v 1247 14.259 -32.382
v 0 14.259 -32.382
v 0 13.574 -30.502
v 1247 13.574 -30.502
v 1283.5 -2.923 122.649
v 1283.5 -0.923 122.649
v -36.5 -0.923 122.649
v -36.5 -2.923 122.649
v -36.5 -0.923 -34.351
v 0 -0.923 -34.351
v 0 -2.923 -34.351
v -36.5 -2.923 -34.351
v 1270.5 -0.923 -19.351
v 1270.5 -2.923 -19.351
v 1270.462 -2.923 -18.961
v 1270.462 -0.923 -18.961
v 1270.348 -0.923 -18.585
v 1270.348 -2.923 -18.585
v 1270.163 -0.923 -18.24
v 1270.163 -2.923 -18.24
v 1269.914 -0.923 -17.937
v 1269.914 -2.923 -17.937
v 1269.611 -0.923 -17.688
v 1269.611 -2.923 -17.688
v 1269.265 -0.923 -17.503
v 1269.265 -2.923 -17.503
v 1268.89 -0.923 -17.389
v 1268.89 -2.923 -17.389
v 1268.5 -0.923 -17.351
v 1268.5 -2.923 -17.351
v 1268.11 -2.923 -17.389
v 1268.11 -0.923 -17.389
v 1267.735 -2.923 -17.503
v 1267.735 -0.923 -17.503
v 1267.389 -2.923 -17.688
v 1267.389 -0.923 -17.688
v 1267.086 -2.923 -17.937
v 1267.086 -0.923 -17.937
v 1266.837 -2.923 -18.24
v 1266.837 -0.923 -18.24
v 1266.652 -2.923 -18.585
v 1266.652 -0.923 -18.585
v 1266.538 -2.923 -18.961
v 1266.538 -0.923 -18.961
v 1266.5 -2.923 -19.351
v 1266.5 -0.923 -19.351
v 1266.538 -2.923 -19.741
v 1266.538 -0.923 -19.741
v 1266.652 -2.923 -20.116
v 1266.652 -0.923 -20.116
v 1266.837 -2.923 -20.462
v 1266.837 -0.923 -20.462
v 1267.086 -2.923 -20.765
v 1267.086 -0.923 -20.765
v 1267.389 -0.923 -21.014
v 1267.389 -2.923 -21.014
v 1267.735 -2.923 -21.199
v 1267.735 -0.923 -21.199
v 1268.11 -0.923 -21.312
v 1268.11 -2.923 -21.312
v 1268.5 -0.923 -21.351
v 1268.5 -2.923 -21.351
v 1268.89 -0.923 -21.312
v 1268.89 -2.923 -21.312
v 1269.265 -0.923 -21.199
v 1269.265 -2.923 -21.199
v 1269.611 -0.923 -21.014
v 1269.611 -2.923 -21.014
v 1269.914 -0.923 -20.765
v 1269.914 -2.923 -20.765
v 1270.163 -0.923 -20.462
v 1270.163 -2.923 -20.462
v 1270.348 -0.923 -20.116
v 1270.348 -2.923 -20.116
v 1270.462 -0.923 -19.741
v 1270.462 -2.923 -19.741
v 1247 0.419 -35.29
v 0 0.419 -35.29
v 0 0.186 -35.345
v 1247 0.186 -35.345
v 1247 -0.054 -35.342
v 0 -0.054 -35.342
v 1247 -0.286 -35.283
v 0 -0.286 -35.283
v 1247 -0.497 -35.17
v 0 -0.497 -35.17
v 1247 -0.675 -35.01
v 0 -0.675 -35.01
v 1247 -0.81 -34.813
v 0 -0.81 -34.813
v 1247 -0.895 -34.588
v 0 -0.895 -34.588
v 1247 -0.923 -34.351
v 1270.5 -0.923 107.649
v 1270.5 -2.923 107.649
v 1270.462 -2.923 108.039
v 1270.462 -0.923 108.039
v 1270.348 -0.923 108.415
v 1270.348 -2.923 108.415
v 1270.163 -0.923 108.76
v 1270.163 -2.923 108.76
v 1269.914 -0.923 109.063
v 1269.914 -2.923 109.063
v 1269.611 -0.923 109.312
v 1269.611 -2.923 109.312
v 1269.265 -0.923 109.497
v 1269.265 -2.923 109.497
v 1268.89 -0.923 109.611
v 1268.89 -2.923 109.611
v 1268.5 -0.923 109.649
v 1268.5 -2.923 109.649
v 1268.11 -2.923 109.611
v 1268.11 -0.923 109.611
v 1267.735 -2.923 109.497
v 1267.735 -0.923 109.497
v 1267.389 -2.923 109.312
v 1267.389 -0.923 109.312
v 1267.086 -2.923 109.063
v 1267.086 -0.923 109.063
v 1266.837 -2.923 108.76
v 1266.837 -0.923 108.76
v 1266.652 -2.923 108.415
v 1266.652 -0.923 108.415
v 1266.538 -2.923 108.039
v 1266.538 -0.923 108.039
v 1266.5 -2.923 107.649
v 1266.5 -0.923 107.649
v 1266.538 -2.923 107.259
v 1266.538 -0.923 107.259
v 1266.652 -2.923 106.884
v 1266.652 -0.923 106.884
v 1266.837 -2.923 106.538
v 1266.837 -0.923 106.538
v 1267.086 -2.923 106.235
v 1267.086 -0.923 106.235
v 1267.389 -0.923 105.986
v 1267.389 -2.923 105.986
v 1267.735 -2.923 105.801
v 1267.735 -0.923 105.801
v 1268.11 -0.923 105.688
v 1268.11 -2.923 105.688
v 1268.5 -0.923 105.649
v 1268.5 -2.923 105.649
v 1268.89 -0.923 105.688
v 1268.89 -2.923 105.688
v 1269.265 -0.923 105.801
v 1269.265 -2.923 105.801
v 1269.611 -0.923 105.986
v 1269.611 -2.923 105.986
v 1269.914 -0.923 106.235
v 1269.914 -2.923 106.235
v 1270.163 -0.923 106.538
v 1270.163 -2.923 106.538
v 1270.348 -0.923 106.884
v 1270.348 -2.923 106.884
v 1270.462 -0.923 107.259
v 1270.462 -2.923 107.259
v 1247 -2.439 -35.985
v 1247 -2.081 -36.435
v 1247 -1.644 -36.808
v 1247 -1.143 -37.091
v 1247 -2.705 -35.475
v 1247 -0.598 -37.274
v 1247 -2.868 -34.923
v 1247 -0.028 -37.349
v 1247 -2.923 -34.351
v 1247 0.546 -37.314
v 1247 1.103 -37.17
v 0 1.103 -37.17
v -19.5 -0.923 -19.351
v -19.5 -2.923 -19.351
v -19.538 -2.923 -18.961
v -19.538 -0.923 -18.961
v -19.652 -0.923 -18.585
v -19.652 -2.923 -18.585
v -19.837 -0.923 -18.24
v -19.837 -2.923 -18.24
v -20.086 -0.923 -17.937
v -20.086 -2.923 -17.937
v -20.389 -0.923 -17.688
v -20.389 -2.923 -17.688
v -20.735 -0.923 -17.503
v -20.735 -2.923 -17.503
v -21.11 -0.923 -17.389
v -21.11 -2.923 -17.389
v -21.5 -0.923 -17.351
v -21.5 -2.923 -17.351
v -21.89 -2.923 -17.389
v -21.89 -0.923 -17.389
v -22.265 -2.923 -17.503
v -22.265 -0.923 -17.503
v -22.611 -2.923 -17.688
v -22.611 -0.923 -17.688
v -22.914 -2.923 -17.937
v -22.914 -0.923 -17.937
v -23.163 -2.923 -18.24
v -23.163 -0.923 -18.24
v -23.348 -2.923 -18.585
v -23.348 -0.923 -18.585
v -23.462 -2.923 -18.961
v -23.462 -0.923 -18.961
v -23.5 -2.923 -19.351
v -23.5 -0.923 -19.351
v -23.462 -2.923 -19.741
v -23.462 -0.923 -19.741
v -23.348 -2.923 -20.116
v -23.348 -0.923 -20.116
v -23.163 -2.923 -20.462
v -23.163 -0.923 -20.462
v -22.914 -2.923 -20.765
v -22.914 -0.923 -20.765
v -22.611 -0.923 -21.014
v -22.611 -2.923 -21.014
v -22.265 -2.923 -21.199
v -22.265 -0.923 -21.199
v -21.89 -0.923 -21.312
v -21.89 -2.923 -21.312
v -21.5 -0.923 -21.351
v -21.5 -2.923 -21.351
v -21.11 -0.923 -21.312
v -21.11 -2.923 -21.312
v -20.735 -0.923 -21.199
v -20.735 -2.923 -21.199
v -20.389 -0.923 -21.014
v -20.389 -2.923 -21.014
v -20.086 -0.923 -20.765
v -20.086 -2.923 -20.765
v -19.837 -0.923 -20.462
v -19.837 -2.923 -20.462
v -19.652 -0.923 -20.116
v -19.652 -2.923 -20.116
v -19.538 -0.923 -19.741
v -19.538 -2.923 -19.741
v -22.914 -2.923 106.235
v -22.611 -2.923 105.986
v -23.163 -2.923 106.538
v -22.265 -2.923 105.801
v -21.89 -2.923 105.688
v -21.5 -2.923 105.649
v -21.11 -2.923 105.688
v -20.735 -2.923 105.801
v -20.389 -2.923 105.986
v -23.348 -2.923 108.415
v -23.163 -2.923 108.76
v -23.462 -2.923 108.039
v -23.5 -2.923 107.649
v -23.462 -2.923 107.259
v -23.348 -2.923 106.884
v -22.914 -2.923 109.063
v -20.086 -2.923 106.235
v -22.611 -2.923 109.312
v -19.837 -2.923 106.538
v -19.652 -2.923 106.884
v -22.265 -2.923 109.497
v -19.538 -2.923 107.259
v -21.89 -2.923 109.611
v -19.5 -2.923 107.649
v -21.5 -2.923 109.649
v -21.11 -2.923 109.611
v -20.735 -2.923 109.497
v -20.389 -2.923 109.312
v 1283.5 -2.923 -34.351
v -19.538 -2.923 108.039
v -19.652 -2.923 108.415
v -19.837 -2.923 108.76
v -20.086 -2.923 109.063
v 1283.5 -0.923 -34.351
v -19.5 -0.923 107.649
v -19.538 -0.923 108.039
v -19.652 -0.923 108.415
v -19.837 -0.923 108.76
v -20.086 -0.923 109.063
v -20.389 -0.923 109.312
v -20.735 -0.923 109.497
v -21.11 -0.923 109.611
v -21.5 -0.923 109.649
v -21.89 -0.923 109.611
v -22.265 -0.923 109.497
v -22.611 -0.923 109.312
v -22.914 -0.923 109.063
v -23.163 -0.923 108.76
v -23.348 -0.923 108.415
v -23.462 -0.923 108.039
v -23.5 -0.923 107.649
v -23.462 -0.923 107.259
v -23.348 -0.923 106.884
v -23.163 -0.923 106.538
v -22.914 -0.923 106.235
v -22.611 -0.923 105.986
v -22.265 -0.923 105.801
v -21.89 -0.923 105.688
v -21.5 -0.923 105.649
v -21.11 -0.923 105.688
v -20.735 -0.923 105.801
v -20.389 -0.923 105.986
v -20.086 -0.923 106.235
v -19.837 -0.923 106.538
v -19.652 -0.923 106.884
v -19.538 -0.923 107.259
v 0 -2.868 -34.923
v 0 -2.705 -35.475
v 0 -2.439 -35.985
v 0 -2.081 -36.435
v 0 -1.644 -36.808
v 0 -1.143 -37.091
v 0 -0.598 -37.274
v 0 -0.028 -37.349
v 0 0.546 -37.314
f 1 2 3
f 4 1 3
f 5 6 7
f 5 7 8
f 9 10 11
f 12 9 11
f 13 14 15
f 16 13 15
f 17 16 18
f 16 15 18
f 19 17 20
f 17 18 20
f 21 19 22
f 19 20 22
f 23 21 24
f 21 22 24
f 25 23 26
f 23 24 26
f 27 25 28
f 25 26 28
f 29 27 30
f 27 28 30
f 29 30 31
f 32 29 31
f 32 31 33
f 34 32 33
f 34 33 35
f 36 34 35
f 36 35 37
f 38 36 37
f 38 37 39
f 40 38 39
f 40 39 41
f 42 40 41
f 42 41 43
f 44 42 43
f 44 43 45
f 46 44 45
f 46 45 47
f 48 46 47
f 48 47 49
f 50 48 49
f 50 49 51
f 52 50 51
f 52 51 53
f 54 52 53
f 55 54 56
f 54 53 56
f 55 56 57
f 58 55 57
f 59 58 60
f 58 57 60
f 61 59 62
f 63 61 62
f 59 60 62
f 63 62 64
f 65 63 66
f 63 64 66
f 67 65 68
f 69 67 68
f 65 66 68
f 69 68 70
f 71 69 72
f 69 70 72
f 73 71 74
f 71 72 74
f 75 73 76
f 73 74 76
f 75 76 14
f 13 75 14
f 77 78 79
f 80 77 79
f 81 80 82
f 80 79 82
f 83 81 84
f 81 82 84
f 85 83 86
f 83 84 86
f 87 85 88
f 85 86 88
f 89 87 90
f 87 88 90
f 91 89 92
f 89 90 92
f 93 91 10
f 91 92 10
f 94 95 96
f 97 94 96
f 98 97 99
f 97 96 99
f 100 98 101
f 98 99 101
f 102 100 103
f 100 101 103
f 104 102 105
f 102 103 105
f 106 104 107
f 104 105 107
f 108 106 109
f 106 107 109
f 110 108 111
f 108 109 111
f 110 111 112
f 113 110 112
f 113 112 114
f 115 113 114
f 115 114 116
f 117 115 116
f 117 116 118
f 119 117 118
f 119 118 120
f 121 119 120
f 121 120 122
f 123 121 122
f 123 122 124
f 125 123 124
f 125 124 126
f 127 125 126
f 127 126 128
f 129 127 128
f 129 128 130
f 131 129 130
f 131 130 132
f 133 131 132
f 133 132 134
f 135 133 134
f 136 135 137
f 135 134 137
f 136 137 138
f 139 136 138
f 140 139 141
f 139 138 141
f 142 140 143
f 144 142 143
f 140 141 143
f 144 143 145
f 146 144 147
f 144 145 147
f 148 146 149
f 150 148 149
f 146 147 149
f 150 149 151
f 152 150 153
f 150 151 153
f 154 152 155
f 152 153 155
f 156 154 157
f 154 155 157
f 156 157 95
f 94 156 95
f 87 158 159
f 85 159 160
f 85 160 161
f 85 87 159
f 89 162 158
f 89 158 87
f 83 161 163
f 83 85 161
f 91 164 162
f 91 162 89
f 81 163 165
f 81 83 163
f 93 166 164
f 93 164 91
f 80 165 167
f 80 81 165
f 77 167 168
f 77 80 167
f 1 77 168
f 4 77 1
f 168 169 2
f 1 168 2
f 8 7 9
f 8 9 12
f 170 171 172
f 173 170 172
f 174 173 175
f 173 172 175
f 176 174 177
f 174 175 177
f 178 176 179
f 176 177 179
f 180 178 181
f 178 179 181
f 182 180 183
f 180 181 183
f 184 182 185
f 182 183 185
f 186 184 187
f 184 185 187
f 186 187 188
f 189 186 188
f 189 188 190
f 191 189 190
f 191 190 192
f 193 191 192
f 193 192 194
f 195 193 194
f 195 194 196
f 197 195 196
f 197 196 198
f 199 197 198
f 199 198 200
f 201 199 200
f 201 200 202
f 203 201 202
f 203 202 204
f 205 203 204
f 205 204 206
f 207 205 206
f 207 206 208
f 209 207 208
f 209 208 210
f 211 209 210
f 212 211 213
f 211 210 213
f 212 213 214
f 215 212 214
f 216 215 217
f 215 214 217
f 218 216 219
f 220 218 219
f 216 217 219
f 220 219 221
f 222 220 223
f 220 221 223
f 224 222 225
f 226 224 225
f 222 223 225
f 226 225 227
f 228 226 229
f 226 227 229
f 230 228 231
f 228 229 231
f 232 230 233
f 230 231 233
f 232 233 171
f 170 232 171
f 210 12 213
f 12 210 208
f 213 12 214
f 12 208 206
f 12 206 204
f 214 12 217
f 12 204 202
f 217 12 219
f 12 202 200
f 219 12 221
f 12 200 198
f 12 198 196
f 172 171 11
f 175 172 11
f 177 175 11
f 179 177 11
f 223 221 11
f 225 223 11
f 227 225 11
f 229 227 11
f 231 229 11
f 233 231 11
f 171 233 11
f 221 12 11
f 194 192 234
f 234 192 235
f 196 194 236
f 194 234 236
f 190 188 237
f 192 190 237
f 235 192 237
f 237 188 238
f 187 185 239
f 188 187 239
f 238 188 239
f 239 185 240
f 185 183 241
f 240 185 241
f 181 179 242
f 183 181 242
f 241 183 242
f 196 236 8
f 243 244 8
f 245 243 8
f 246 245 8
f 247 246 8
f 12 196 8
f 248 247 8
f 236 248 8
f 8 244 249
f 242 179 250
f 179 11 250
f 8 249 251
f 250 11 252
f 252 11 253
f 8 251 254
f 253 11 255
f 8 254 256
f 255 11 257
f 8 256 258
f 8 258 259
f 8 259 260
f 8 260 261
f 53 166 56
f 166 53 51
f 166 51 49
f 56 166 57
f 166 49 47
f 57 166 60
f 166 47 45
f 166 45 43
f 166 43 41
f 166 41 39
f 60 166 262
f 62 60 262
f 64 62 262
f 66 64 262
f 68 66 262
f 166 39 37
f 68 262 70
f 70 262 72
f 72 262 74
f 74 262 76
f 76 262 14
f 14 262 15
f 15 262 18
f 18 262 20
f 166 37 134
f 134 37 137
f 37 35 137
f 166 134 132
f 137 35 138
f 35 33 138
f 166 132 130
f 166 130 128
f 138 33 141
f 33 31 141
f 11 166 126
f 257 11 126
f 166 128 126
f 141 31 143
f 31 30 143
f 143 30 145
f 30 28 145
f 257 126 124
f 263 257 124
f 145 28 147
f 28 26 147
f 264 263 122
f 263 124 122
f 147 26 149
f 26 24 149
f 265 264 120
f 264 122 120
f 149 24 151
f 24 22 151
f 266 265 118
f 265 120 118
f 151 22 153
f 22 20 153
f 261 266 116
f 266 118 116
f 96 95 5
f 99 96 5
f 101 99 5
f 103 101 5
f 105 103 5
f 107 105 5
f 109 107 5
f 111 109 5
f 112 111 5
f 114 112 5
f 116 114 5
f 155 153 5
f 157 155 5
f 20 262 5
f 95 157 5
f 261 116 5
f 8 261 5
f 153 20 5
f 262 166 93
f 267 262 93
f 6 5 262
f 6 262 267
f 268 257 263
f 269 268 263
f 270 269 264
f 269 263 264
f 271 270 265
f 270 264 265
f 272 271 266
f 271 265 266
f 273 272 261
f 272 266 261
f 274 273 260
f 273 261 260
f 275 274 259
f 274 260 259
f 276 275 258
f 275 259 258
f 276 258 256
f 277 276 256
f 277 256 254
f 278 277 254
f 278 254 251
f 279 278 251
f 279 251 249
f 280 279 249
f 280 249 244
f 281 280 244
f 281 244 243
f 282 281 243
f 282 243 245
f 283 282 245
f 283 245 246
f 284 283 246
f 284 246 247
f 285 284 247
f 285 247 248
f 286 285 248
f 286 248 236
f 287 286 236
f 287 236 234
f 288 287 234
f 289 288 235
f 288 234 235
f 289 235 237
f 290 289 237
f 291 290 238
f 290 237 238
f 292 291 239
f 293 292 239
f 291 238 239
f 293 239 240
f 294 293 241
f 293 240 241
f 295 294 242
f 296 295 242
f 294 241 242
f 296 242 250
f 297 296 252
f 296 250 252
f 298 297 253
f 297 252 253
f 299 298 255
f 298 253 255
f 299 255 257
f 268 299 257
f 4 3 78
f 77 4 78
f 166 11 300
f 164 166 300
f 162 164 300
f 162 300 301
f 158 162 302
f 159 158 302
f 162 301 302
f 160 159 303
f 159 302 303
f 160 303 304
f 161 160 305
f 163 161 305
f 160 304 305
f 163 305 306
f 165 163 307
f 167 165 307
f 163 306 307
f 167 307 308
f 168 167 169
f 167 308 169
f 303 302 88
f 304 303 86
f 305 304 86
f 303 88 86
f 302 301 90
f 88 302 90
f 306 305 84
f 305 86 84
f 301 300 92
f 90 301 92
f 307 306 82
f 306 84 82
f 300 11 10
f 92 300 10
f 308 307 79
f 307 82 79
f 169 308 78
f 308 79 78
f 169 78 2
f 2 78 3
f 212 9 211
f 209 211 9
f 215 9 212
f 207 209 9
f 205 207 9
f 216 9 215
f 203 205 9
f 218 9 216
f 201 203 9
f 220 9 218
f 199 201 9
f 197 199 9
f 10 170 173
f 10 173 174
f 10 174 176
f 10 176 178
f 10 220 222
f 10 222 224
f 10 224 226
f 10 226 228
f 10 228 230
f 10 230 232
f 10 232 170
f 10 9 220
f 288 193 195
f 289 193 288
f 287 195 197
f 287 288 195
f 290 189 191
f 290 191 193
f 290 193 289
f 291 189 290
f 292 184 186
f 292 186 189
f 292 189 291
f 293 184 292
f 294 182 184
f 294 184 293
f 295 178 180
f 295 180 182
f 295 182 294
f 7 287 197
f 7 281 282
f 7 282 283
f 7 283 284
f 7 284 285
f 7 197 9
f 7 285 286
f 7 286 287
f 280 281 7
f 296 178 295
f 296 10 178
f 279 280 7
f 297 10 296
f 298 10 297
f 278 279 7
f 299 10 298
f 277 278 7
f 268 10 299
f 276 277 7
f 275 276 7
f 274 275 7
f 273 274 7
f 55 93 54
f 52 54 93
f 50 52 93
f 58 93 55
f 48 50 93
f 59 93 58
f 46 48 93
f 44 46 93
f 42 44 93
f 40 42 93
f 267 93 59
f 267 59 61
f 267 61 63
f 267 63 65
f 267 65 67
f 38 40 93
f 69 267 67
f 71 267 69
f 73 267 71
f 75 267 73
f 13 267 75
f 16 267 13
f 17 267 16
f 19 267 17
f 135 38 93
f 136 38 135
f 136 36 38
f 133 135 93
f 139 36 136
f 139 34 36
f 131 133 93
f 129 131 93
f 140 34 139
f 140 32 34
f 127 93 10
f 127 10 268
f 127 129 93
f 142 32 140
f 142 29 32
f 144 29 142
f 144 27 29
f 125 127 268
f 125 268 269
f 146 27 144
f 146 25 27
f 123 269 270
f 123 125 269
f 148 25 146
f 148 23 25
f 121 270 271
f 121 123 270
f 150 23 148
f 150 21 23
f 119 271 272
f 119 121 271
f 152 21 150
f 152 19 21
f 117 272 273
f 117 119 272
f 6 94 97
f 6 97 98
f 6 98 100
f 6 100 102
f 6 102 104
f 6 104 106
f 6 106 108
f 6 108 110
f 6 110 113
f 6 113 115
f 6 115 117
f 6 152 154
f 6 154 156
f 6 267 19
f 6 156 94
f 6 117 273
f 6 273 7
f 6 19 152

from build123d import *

# Parameters (mm, degrees)
F1_DEPTH = 1247
F2_W     = 2
F2_H     = 157
F3_DEPTH = 36.5
F4_W     = 2
F4_H     = 157
F5_DEPTH = 36.5
F6_R     = 2
F7_DEPTH = 17.182757


with BuildPart() as f1:
    # F0 (on Right) → F1 (new body)
    with BuildSketch(Plane.YZ):
        with BuildLine():
            Line((-0.923239, 122.649228), (-2.923239, 122.649228))
            Line((-2.923239, 122.649228), (-2.923239, -34.350772))
            ThreePointArc((-2.923239, -34.350772), (-1.643968, -36.808228), (1.102821, -37.16985))
            Line((1.102821, -37.16985), (14.258518, -32.381568))
            Line((14.258518, -32.381568), (13.574478, -30.502182))
            Line((13.574478, -30.502182), (0.418781, -35.290464))
            ThreePointArc((0.418781, -35.290464), (-0.496816, -35.169924), (-0.923239, -34.350772))
            Line((-0.923239, -34.350772), (-0.923239, 122.649228))
        make_face()
    extrude(amount=F1_DEPTH)

    # F2 (on face) → F3 (join)
    with BuildSketch(Plane.YZ.offset(1247)):
        with Locations((-1.923239, 44.149228)):
            Rectangle(F2_W, F2_H)
    extrude(amount=F3_DEPTH)

    # F4 (on face) → F5 (join)
    with BuildSketch(Plane(origin=(0, 0, 0), x_dir=(0, -1, 0), z_dir=(-1, 0, 0))):
        with Locations((1.923239, 44.149228)):
            Rectangle(F4_W, F4_H)
    extrude(amount=F5_DEPTH)

    # F6 (on face) → F7 (cut, through all)
    with BuildSketch(Plane.XZ.offset(2.923239)):
        with Locations((-21.5, 107.649228)):
            Circle(F6_R)
        with Locations((-21.5, -19.350772)):
            Circle(F6_R)
        with Locations((1268.5, 107.649228)):
            Circle(F6_R)
        with Locations((1268.5, -19.350772)):
            Circle(F6_R)
    extrude(amount=-F7_DEPTH, mode=Mode.SUBTRACT)


solid = f1.part
